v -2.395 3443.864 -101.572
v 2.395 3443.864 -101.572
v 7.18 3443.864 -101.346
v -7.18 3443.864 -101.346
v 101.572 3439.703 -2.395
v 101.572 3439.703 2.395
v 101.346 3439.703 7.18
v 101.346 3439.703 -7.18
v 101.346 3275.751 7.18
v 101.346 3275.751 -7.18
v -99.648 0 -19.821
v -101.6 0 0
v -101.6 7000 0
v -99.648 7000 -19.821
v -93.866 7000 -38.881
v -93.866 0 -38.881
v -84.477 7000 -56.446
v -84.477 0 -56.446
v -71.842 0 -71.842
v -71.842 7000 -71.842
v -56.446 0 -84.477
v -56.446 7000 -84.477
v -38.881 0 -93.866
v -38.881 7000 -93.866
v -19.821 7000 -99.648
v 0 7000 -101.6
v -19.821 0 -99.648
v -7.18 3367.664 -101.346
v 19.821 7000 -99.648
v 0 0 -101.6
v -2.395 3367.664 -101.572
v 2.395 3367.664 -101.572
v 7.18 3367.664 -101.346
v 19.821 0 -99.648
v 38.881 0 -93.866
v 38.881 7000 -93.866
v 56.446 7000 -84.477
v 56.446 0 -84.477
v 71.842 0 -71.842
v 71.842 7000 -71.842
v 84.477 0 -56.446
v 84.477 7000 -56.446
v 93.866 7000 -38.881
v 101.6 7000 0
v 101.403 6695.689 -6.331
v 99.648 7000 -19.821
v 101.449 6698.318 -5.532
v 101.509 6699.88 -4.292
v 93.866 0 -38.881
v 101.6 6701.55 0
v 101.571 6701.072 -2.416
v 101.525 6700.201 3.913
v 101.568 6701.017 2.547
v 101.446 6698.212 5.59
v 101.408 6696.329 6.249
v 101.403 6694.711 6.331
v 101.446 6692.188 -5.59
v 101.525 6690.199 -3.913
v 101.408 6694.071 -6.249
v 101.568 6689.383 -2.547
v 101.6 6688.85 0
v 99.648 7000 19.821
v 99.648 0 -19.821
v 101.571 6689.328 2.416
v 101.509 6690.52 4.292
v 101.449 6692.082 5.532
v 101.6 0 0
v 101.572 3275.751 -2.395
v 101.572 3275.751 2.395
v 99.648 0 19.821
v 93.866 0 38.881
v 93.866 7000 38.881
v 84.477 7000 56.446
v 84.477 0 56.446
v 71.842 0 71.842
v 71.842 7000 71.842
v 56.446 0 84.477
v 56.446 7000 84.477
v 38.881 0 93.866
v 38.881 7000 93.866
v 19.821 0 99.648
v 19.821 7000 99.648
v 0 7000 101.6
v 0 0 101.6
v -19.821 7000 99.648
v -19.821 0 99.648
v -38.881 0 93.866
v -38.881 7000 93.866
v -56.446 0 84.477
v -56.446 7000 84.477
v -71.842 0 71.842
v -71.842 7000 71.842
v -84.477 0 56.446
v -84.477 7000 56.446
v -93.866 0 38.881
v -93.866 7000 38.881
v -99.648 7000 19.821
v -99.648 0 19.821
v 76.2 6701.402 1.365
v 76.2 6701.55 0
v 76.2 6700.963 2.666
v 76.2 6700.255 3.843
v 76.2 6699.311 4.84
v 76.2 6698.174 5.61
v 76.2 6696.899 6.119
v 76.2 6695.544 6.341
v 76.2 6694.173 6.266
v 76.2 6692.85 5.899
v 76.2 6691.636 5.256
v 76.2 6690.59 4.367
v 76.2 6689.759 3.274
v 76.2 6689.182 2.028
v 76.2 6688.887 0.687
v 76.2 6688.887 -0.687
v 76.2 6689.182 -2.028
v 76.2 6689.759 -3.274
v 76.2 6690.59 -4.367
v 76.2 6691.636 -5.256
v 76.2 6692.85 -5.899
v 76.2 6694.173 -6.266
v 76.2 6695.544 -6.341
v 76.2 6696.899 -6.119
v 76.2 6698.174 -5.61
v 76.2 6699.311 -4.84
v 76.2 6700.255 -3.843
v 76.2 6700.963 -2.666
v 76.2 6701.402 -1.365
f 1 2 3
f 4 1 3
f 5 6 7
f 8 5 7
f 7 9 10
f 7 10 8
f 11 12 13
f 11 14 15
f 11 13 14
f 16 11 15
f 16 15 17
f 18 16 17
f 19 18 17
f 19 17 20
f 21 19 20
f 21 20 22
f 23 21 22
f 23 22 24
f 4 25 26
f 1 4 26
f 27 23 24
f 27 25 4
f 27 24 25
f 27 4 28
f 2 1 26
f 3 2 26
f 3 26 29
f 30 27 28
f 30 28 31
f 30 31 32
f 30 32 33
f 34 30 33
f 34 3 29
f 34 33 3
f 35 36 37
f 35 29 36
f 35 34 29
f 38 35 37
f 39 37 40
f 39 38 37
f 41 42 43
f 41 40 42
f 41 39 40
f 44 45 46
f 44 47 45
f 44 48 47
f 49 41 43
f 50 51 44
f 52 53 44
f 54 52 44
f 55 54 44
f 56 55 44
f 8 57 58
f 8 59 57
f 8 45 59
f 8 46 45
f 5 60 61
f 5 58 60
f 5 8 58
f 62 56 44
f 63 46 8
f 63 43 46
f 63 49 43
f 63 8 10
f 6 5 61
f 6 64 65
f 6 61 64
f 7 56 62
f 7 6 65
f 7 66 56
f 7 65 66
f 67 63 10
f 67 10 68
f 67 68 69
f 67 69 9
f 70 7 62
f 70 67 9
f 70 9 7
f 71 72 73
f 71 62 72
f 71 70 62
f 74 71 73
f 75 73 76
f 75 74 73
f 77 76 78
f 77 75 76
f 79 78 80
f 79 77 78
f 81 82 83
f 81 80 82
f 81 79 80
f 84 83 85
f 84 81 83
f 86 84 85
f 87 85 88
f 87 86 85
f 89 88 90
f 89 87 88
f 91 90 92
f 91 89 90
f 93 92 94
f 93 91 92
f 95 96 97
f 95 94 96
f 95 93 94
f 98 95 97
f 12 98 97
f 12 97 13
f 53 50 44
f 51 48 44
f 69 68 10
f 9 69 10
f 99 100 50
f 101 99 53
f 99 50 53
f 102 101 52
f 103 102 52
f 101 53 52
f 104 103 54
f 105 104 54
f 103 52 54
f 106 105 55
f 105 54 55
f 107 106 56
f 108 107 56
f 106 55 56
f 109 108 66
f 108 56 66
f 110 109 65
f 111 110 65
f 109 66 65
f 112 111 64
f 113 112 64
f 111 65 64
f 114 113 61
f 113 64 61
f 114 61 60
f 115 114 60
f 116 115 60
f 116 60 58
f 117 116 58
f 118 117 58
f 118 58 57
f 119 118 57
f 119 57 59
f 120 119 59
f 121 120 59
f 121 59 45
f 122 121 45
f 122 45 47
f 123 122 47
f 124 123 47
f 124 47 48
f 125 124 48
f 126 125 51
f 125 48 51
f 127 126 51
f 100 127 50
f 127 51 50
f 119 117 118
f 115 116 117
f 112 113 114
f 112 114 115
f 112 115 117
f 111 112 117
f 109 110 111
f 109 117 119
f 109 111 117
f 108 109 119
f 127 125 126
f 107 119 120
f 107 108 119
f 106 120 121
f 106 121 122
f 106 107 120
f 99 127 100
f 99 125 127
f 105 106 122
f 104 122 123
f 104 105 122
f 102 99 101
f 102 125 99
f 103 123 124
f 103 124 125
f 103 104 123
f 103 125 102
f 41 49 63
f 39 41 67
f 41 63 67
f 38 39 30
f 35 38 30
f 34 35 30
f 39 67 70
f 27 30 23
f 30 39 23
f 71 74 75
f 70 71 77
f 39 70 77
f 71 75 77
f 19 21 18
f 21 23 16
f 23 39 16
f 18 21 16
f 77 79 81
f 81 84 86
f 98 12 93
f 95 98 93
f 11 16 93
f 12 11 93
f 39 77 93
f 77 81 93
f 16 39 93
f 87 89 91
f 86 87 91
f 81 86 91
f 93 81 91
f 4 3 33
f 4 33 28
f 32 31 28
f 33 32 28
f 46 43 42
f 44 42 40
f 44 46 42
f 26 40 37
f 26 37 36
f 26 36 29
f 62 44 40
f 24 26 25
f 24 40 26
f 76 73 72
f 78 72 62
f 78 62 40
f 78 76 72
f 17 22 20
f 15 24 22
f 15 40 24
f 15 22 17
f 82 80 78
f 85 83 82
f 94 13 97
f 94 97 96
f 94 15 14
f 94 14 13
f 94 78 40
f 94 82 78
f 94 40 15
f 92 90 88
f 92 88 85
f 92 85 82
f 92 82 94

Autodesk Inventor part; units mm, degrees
ref_plane "YZ Plane" through (0, 0, 0) normal (1, 0, 0) x (0, 1, 0)
sketch "Sketch1" plane through (0, 0, 0) normal (0, 1, 0) x (-1, 0, 0)
  circle A0 centre (0, 0) radius 101.6
  dimension "d0" = 203.2
extrude "Extrusion1" add sketch "Sketch1" along normal blind 7000
sketch "Sketch2" plane through (0, 0, 0) normal (0, -1, 0) x (1, 0, 0)
  circle A0 centre (0, 0) radius 101.6 projected
extrude "Extrusion2" [suppressed]
sketch "Sketch3" plane through (0, 7000, 0) normal (0, 1, 0) x (1, 0, 0)
  circle A0 centre (0, 0) radius 101.6 projected
  point P0 (101.6, 0)
ref_plane "Work Plane1" through (101.6, 7000, 0) normal (1, 0, 0) x (0, 1, 0)
sketch "Sketch4" plane through (101.6, 7000, 0) normal (1, 0, 0) x (0, 1, 0)
  line L0 (-3724.2493, -34.0955) -> (-3560.2966, -34.0955)
  line L1 (-3560.2966, -34.0955) -> (-3560.2966, 34.0407)
  line L2 (-3560.2966, 34.0407) -> (-3724.2493, 34.0407)
  line L3 (-3724.2493, 34.0407) -> (-3724.2493, -34.0955)
  line L4 (-3724.2493, -0.0274) -> (-3560.2966, -0.0274) construction
  point P0 (-7000, 0)
extrude "poleStandRadialRef" cut sketch "Sketch4" against normal blind 0.254
sketch "Sketch5" plane through (0, 7000, 0) normal (0, 1, 0) x (1, 0, 0)
  circle A0 centre (0, 0) radius 101.6 projected
  point P0 (0, 101.6)
ref_plane "Work Plane2" through (0, 7000, -101.6) normal (0, 0, -1) x (-1, 0, 0)
sketch "Sketch6" plane through (0, 7000, -101.6) normal (0, 0, -1) x (-1, 0, 0)
  line L0 (-25.3983, -3556.136) -> (25.4017, -3556.136)
  line L1 (25.4017, -3556.136) -> (25.4017, -3632.336)
  line L2 (25.4017, -3632.336) -> (-25.3983, -3632.336)
  line L3 (-25.3983, -3632.336) -> (-25.3983, -3556.136)
  line L4 (0.0017, -3556.136) -> (0.0017, -3632.336) construction
  point P0 (0, -7000)
  dimension "d7" = 50.8
  dimension "d8" = 76.2
extrude "poleStandOffsetRef" cut sketch "Sketch6" against normal blind 0.254
sketch "Sketch7" plane through (101.6, 7000, 0) normal (1, 0, 0) x (0, 1, 0)
  circle A0 centre (-304.8, 0) radius 6.35
  line L0 (0, -101.6) -> (0, 101.6) projected
  point P0 (-7000, 0)
  dimension "d11" = 12.7
  dimension "d12" = 304.8
extrude "eyeBoltHole" cut sketch "Sketch7" against normal blind 25.4
properties part number "2p2pol" material "Wood (Maple)"
